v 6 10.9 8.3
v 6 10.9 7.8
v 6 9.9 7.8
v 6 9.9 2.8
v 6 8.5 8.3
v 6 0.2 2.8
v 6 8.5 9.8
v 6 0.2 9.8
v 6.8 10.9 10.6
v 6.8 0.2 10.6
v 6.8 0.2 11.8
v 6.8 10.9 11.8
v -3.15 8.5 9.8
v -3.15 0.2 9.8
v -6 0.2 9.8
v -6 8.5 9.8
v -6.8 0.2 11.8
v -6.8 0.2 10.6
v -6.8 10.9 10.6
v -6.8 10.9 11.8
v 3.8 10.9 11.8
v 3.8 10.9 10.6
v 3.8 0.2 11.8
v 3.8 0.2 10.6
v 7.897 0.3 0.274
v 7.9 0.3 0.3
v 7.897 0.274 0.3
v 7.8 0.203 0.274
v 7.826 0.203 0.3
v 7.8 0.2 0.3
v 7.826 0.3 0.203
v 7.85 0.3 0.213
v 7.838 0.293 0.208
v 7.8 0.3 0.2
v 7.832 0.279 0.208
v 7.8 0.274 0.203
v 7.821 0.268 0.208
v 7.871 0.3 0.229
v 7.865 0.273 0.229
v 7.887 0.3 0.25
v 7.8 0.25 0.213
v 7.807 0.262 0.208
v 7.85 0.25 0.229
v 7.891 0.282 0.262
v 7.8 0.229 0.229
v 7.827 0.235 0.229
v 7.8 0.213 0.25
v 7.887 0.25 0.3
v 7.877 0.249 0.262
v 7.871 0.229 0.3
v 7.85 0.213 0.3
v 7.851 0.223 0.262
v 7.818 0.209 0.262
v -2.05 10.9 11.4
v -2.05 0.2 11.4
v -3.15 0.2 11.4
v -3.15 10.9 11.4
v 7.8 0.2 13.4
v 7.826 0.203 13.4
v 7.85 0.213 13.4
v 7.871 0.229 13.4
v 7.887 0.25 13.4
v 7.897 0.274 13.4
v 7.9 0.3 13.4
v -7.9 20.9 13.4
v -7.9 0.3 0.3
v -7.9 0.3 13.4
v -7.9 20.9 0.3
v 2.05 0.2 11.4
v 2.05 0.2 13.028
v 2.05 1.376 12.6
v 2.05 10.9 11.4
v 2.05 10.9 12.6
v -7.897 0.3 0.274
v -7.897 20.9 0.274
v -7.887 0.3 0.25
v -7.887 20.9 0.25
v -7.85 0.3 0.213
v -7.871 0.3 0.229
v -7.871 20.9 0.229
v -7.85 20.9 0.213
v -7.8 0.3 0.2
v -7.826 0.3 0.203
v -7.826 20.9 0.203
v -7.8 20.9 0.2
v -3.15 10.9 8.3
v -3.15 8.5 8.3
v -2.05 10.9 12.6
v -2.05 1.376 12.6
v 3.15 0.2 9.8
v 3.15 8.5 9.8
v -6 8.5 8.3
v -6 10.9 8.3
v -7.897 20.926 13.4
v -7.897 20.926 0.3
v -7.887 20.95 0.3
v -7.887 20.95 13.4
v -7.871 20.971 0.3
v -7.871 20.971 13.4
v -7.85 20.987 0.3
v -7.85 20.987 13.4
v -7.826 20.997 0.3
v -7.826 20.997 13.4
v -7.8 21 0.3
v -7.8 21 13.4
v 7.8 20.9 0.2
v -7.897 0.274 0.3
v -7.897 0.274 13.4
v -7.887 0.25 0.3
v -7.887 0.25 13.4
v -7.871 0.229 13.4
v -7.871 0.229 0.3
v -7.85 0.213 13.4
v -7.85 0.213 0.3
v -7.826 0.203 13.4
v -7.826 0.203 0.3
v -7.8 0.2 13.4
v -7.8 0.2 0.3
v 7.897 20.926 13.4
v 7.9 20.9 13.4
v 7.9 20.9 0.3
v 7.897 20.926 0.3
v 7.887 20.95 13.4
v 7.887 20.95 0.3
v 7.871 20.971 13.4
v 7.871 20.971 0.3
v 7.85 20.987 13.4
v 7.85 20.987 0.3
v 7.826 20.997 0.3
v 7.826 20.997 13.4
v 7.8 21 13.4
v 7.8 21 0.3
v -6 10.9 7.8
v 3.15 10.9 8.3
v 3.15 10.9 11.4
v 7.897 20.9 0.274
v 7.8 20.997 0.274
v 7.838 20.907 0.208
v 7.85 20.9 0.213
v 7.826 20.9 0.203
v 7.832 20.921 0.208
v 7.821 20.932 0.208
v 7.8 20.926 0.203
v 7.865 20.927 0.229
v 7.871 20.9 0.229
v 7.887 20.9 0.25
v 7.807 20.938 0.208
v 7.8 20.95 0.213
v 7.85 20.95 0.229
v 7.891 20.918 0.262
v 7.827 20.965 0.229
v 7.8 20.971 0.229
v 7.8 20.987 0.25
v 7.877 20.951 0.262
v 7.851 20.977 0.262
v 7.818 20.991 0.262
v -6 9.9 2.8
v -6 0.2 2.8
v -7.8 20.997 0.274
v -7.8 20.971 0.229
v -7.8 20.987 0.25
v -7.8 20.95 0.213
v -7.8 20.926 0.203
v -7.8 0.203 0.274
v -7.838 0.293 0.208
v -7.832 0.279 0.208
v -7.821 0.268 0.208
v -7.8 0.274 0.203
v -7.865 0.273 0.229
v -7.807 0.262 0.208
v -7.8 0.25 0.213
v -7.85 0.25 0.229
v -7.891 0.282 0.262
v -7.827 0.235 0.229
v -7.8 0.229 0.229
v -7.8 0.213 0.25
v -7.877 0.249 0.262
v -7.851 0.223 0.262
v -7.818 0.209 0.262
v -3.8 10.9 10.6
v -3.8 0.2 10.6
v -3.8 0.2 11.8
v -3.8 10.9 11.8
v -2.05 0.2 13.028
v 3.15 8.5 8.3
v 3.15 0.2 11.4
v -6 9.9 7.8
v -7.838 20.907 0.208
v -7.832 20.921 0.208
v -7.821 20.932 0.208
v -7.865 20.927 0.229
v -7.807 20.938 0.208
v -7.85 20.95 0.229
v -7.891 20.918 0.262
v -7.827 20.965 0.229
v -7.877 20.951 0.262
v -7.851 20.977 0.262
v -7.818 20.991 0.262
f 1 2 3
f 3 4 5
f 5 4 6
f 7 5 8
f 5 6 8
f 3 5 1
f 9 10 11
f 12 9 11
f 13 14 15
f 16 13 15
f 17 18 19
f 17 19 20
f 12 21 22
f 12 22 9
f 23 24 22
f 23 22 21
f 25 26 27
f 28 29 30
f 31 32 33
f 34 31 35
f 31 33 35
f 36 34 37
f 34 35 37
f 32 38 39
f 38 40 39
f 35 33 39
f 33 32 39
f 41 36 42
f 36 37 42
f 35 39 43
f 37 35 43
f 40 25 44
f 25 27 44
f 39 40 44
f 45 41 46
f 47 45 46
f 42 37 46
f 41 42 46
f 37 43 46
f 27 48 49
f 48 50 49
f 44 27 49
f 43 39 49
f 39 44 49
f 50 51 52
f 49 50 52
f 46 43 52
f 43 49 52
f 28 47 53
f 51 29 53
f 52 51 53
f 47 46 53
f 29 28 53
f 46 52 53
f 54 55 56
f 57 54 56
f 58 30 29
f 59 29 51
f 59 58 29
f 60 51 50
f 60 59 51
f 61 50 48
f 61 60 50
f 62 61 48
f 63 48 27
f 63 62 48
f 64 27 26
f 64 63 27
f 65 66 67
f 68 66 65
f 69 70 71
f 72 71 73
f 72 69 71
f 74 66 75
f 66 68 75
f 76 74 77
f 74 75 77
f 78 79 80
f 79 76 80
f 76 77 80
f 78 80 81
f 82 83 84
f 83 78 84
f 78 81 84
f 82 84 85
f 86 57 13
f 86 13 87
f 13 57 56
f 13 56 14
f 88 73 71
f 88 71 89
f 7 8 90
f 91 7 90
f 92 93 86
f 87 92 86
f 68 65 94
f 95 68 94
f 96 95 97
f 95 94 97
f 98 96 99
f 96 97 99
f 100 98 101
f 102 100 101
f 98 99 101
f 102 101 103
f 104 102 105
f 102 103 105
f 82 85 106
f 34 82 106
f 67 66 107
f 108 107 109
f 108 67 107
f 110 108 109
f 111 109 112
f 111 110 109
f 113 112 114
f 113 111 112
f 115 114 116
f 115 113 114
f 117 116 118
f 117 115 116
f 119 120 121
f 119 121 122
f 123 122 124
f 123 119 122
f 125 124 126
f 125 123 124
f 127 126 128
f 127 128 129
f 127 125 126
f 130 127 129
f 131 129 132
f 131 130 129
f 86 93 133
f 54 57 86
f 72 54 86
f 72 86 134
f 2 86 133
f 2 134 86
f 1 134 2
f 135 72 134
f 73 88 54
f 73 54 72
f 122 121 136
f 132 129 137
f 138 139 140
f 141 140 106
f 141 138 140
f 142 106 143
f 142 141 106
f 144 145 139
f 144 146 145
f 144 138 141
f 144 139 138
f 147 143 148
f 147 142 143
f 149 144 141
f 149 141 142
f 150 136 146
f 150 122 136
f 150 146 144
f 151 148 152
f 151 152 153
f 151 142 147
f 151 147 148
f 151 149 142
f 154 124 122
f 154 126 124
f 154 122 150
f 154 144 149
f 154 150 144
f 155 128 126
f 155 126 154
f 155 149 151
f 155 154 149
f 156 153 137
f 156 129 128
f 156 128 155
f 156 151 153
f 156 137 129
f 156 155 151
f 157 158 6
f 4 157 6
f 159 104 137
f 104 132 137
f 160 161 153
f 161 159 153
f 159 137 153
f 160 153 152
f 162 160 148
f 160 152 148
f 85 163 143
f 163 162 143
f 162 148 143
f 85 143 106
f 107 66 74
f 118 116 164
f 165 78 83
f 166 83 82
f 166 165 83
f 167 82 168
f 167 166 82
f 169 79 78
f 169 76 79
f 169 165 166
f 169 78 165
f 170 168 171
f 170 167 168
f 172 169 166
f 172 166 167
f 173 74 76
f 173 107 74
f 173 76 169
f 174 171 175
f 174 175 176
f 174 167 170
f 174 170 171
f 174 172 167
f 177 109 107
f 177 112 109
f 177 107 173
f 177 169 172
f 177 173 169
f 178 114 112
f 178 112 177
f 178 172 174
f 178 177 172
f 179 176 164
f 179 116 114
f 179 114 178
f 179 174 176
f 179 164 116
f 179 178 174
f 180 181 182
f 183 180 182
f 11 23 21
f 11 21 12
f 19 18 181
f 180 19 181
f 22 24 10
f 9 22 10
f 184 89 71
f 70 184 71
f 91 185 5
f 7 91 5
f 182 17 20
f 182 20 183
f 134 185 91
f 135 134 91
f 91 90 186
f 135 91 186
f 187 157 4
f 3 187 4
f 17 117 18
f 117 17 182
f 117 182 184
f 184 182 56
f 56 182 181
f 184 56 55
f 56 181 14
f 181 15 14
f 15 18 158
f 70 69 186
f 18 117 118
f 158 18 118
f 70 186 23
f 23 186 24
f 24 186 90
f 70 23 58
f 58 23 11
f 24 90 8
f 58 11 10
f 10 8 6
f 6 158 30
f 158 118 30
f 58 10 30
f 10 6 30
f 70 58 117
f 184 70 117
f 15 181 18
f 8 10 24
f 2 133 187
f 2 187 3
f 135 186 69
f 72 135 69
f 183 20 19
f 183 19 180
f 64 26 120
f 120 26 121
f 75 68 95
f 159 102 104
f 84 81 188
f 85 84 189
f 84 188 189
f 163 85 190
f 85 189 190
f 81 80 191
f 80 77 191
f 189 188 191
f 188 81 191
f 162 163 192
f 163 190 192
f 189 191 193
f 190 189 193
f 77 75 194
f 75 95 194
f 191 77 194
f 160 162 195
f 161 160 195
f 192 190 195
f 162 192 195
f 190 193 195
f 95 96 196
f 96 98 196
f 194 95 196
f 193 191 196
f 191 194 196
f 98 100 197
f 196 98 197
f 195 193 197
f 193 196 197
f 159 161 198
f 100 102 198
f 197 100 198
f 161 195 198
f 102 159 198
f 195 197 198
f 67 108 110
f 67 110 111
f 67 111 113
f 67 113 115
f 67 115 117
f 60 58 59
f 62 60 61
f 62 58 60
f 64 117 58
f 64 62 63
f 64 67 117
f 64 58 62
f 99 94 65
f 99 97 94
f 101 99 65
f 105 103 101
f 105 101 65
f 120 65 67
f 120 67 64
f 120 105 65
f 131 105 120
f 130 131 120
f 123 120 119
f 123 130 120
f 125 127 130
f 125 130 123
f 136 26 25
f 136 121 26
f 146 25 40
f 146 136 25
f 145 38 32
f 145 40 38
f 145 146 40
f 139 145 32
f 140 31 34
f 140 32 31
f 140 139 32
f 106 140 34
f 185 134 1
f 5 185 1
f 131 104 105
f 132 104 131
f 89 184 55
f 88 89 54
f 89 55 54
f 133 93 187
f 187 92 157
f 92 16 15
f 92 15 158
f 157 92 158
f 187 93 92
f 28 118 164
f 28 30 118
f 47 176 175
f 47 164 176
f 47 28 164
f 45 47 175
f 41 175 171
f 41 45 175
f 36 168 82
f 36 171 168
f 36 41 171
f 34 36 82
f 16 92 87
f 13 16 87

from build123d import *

# Parameters (mm, degrees)
BOX038_W               = 4.1
BOX038_H               = 5
BOX038_DEPTH           = 2
BOX038_PLACEMENT_ANGLE = 20
BOX037_W               = 2.85
BOX037_H               = 2.4
BOX037_DEPTH           = 1.5
BOX036_W               = 12
BOX036_H               = 1
BOX036_DEPTH           = 5
SKETCH035_W            = 3
SKETCH035_H            = 1.2
EXTRUDE005_DEPTH       = 10.8
BOX007_W               = 15.8
BOX007_H               = 20.8
BOX007_DEPTH           = 13.2
FILLET008_R            = 0.1


with BuildPart() as cube017:
    # Box038 → Box038 (new body)
    with BuildSketch(Plane.XY):
        with Locations((2.05, 2.5)):
            Rectangle(BOX038_W, BOX038_H)
    extrude(amount=BOX038_DEPTH)


with BuildPart() as cube017_1:
    # Box038 placement: moved
    add(cube017.part.moved(Location((-2.05, -1, 11.2))).rotate(Axis((-2.05, -1, 11.2), (-1, 0, 0)), BOX038_PLACEMENT_ANGLE))


with BuildPart() as cube016:
    # Box037 → Box037 (new body)
    with BuildSketch(Plane(origin=(3.15, 8.4, 8.2), x_dir=(1, 0, 0), z_dir=(0, 0, 1))):
        with Locations((1.425, 1.2)):
            Rectangle(BOX037_W, BOX037_H)
    extrude(amount=BOX037_DEPTH)


with BuildPart() as cube041:
    # Clone base: copy of Cube016
    add(cube016.part)


with BuildPart() as cube041_1:
    # Clone placement: moved
    add(cube041.part.moved(Location((-9.15, 0, 0))))


with BuildPart() as fusion024:
    # Box036 → Box036 (new body)
    with BuildSketch(Plane(origin=(-6, 9.8, 2.7), x_dir=(1, 0, 0), z_dir=(0, 0, 1))):
        with Locations((6, 0.5)):
            Rectangle(BOX036_W, BOX036_H)
    extrude(amount=BOX036_DEPTH)

    # Fusion024: union Cube016, Cube041
    add(cube016.part)
    add(cube041_1.part)


with BuildPart() as fusion025:
    # Sketch035 → Extrude005 (new body)
    with BuildSketch(Plane.XZ):
        Polygon((-6, 9.7), (-6, 2.7), (6, 2.7), (6, 9.7), (3.15, 9.7), (3.15, 11.3), (2.05, 11.3), (2.05, 12.5), (-2.05, 12.5), (-2.05, 11.3), (-3.15, 11.3), (-3.15, 9.7), align=None)
        with Locations((-5.3, 11.1)):
            Rectangle(SKETCH035_W, SKETCH035_H)
        with Locations((5.3, 11.1)):
            Rectangle(SKETCH035_W, SKETCH035_H)
    extrude(amount=-EXTRUDE005_DEPTH)

    # Cut001: cut Fusion024
    add(fusion024.part, mode=Mode.SUBTRACT)

    # Fusion025: union Cube017
    add(cube017_1.part)


with BuildPart() as fusion025_1:
    # Fusion025 placement: moved
    add(fusion025.part.moved(Location((0, 0.1, 0.1))))


with BuildPart() as body009:
    # Box007 → Box007 (new body)
    with BuildSketch(Plane(origin=(-7.9, 0.2, 0.2), x_dir=(1, 0, 0), z_dir=(0, 0, 1))):
        with Locations((7.9, 10.4)):
            Rectangle(BOX007_W, BOX007_H)
    extrude(amount=BOX007_DEPTH)

    # Fillet008
    fillet008_edges = [body009.edges().sort_by_distance(p)[0] for p in [
        (-7.9, 0.2, 6.8),
        (-7.9, 21, 6.8),
        (-7.9, 10.6, 0.2),
        (7.9, 0.2, 6.8),
        (7.9, 21, 6.8),
        (7.9, 10.6, 0.2),
        (0, 0.2, 0.2),
        (0, 21, 0.2),
    ]]
    fillet(fillet008_edges, radius=FILLET008_R)

    # Cut008: cut Fusion025
    add(fusion025_1.part, mode=Mode.SUBTRACT)


solid = body009.part
